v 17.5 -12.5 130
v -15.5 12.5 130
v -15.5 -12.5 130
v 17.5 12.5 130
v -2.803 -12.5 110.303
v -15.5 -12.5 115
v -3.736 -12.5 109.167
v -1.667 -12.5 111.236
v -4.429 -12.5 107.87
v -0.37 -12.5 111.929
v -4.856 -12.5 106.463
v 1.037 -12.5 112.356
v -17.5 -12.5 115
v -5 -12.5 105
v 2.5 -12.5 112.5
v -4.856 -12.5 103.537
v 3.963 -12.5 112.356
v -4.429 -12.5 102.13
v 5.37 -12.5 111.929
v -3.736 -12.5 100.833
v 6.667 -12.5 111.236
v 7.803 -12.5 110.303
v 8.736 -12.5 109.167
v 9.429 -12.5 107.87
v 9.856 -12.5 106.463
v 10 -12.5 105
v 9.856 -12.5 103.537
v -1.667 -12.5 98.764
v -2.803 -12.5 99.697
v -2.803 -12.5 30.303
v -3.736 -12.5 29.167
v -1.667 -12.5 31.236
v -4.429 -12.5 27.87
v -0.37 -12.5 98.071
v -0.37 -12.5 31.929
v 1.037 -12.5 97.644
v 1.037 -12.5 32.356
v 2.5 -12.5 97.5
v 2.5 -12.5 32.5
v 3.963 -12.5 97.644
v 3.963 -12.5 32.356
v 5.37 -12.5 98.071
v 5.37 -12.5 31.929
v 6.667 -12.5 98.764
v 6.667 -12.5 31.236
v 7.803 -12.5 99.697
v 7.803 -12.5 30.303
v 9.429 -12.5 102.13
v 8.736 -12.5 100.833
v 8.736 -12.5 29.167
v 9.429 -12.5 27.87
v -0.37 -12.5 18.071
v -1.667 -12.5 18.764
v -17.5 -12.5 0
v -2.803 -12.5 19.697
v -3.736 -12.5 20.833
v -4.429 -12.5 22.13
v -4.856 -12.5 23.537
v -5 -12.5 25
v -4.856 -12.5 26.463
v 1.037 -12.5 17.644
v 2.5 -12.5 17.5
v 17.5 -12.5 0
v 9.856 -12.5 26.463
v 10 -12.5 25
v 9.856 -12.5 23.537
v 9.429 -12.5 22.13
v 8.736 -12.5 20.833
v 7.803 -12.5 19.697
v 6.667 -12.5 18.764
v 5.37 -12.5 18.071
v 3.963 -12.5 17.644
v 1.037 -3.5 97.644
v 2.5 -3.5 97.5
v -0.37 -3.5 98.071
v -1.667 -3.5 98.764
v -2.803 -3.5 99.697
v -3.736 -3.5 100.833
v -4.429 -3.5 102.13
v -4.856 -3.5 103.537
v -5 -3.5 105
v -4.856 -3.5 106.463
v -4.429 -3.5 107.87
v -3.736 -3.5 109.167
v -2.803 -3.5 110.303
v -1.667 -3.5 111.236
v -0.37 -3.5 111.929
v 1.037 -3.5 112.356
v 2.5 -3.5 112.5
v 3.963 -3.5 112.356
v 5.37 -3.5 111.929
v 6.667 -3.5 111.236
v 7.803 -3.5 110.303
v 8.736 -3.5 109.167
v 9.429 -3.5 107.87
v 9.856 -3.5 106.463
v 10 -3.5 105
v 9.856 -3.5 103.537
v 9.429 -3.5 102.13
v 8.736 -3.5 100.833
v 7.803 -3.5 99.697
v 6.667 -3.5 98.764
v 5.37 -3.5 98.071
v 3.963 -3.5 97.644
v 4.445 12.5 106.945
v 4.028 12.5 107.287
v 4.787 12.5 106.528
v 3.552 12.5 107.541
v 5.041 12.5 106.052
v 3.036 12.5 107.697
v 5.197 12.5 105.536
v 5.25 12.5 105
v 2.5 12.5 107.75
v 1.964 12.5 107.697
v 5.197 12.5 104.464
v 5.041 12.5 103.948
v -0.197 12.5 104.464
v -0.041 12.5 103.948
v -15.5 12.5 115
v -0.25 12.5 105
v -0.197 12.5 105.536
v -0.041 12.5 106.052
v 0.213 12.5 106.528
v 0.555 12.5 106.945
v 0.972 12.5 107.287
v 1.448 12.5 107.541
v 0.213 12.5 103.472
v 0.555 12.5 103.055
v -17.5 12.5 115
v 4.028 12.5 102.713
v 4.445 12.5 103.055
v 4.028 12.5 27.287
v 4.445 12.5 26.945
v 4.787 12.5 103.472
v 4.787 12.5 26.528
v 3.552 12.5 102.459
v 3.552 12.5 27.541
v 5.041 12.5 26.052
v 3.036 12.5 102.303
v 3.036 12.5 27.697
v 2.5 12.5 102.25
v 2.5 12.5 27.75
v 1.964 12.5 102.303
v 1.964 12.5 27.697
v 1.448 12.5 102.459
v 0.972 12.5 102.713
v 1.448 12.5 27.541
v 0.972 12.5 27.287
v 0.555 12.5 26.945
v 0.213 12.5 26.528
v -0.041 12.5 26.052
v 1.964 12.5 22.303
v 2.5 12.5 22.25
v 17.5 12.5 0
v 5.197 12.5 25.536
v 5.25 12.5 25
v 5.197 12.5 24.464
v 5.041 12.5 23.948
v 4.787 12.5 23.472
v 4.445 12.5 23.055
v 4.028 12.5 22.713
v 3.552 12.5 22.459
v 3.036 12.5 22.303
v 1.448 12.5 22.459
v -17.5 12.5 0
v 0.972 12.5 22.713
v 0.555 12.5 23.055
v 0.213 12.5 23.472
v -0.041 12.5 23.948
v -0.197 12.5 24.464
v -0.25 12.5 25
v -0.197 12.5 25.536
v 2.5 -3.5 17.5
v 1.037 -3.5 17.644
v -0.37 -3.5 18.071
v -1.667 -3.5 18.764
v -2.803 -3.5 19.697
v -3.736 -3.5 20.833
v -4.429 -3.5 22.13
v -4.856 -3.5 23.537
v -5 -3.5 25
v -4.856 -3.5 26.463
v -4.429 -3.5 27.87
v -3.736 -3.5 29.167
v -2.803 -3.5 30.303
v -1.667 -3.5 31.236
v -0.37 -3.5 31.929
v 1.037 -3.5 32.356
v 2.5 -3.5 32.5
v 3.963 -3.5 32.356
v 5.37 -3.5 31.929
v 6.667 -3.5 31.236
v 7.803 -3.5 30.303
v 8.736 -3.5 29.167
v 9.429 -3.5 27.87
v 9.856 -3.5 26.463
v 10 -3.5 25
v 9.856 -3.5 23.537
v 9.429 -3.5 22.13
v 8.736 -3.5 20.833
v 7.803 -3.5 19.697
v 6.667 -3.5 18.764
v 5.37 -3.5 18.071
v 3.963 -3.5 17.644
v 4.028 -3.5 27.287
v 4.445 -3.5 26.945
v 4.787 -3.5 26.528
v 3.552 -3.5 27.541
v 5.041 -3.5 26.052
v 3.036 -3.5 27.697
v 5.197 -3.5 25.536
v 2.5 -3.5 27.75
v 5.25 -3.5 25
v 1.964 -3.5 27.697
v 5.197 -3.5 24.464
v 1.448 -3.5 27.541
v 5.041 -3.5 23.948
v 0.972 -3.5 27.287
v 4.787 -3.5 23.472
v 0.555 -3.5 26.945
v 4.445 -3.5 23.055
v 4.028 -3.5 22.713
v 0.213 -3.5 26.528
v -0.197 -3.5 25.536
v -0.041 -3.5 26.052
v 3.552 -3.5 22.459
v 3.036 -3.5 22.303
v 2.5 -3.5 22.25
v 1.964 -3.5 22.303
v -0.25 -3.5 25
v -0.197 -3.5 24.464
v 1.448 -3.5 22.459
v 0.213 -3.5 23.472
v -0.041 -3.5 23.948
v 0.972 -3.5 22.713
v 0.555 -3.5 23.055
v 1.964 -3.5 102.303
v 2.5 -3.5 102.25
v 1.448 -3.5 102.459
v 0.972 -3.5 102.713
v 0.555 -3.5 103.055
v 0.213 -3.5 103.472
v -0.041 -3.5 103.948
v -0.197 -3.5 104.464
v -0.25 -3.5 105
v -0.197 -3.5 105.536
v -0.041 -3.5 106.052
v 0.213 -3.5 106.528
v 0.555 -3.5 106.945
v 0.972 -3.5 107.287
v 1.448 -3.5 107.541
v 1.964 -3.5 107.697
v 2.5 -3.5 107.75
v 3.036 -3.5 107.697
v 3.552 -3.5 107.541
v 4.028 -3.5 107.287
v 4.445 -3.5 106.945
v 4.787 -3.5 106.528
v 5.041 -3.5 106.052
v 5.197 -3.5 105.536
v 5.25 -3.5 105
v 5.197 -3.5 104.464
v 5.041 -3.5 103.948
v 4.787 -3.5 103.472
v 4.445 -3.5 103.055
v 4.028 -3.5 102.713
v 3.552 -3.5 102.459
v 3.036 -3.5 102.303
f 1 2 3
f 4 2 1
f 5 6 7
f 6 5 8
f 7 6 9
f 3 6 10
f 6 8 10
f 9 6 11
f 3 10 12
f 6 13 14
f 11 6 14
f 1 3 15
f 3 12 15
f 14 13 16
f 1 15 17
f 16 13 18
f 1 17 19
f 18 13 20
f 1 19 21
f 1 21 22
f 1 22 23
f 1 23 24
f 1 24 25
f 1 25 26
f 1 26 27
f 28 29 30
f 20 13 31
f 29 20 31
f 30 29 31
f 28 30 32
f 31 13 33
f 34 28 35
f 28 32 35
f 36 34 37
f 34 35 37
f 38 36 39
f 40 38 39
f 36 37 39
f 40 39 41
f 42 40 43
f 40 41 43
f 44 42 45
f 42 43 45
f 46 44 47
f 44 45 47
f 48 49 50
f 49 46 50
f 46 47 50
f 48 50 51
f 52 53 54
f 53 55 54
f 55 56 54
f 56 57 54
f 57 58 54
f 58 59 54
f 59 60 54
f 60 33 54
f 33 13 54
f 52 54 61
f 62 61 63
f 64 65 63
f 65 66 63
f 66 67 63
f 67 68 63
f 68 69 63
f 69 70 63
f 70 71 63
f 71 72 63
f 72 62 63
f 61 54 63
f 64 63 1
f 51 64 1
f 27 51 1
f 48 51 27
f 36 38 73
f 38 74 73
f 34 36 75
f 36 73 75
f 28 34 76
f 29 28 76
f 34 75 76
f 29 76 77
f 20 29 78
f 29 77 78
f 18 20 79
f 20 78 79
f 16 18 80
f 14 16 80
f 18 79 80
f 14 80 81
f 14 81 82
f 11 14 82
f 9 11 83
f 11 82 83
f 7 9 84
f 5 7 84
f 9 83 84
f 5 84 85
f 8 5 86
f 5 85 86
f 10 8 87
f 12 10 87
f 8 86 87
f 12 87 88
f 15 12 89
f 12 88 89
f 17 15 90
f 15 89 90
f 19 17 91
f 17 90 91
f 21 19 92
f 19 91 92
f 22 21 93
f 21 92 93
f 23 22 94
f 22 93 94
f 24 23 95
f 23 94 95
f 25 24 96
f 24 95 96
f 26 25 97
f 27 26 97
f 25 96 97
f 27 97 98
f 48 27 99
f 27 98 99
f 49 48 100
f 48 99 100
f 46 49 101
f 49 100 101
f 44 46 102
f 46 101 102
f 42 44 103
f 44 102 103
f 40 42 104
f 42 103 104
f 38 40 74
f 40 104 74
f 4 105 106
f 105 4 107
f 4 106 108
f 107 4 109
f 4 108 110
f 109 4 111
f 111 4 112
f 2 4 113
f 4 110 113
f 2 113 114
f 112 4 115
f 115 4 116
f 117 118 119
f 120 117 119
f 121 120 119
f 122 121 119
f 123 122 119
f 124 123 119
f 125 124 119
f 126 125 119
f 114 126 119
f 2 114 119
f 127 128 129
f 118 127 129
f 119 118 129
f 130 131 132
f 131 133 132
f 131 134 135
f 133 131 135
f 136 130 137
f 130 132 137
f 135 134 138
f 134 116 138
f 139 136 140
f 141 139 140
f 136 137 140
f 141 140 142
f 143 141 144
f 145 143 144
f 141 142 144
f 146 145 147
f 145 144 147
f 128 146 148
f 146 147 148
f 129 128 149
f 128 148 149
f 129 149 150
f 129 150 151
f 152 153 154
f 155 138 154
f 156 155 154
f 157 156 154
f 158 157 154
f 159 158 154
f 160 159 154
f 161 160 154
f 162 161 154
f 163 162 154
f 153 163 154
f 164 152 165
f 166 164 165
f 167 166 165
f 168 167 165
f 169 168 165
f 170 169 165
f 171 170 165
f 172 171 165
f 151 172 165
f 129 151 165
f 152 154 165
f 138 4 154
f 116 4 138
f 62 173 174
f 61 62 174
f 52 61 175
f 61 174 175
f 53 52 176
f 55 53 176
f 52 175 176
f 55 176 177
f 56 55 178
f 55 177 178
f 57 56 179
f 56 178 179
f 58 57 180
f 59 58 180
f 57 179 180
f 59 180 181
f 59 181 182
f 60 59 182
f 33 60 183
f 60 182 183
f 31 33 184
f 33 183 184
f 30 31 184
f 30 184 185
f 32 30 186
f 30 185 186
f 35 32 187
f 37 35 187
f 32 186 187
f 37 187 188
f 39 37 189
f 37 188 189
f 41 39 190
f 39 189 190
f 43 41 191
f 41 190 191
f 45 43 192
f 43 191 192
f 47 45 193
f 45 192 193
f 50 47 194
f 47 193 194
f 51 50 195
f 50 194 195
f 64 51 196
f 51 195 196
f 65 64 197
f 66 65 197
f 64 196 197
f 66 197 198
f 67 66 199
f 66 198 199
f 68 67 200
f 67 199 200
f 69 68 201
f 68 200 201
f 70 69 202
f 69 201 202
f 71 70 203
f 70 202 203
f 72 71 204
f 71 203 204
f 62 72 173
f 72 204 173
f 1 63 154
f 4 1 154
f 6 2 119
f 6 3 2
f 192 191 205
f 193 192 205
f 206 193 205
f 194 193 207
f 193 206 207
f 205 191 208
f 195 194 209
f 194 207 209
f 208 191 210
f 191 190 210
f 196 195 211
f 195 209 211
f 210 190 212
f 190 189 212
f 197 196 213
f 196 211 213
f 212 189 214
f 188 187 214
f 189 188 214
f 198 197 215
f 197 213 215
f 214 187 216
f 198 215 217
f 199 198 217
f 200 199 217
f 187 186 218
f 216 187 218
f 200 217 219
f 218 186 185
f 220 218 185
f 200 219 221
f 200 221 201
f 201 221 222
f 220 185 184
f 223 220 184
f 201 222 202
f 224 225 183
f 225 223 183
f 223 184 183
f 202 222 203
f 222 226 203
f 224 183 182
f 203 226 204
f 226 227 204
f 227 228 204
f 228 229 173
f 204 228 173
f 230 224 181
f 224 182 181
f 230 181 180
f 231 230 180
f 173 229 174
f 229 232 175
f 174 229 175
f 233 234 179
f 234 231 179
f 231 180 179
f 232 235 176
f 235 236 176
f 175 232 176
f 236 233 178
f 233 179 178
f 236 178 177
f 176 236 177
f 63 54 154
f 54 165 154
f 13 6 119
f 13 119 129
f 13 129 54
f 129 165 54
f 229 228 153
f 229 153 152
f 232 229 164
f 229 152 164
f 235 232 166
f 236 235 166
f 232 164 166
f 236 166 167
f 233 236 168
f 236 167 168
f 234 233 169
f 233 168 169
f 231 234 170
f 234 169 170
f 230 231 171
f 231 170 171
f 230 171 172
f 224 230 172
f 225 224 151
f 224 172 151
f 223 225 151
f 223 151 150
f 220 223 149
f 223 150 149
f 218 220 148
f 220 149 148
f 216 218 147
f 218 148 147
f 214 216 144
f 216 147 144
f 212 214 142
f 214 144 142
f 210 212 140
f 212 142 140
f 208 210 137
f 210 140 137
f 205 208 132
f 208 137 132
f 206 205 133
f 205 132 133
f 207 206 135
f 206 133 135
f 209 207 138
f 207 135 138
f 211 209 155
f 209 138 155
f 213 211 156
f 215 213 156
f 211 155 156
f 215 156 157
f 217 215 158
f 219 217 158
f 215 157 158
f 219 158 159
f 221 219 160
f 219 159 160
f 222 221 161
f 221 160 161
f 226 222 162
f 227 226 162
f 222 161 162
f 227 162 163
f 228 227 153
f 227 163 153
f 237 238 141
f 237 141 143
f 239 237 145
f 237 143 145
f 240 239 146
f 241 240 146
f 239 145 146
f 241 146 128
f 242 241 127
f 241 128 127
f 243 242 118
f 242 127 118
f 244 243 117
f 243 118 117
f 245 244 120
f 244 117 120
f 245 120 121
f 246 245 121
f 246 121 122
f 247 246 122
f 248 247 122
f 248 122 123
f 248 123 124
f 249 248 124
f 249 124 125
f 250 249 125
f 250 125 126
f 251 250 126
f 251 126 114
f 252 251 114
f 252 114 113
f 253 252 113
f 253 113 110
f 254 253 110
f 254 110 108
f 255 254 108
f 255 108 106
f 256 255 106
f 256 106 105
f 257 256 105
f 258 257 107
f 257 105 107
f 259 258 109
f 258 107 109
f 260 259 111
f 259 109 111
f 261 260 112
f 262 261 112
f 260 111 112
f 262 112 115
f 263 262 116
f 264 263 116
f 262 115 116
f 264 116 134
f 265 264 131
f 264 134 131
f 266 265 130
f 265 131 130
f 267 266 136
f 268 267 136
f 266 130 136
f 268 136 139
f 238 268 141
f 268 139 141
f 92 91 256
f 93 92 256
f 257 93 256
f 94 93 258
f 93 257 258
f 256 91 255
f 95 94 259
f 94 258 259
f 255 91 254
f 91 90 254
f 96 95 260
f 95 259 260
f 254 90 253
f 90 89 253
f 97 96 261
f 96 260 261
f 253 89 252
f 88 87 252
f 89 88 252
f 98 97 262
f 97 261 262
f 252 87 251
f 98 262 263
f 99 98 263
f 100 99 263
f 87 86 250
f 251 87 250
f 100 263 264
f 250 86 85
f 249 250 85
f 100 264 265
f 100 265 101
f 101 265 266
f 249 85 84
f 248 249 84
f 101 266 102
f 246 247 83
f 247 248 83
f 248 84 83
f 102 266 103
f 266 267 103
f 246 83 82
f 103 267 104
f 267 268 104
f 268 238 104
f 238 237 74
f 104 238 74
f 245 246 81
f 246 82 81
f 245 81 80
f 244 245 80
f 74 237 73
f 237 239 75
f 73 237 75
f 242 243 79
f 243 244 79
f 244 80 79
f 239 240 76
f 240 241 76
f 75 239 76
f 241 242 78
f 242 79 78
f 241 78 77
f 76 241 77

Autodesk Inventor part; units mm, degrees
ref_plane "YZ Plane" through (0, 0, 0) normal (1, 0, 0) x (0, 1, 0)
ref_plane "XZ Plane" through (0, 0, 0) normal (0, 1, 0) x (-1, 0, 0)
ref_plane "XY Plane" through (0, 0, 0) normal (0, 0, 1) x (1, 0, 0)
sketch "Sketch1" plane through (0, 0, 0) normal (0, 0, 1) x (1, 0, 0)
  line L0 (-17.5, -12.5) -> (17.5, -12.5)
  line L1 (17.5, -12.5) -> (17.5, 12.5)
  line L2 (17.5, 12.5) -> (-17.5, 12.5)
  line L3 (-17.5, 12.5) -> (-17.5, -12.5)
  line L4 (-17.5, -12.5) -> (17.5, 12.5) construction
  line L5 (17.5, -12.5) -> (-17.5, 12.5) construction
  point P0 (0, 0)
  dimension "d0" = 35
  dimension "d1" = 25
extrude "Extrusion1" add sketch "Sketch1" along normal blind 130
sketch "Sketch2" plane through (-17.5, -12.5, 0) normal (0, -1, 0) x (1, 0, 0)
  line L0 (2, 115) -> (0, 115)
  line L1 (0, 115) -> (0, 130)
  line L2 (0, 130) -> (2, 130)
  line L3 (2, 130) -> (2, 115)
  line L4 (0, 0) -> (0, 130) projected
  line L5 (0, 130) -> (35, 130) projected
  point P0 (17.5, 0)
  dimension "d4" = 2
  dimension "d5" = 15
extrude "Extrusion2" cut sketch "Sketch2" against normal through all
sketch "Sketch3" plane through (-17.5, -12.5, 0) normal (0, -1, 0) x (1, 0, 0)
  line L0 (2, 130) -> (35, 130) projected
  line L1 (35, 0) -> (35, 130) projected
  line L2 (0, 0) -> (35, 0) projected
  point P0 (17.5, 0)
  point P1 (20, 105)
  point P2 (20, 25)
  dimension "d8" = 25
  dimension "d9" = 15
  dimension "d10" = 25
hole "Hole1" at (2.5, -12.5, 105) at (2.5, -12.5, 25) direction (0, 1, 0) diameter 5.5 end through all counterbore diameter 15 counterbore depth 9 clearance for "Socket Head Cap Screw ISO 4762" size "M5" standard "ISO"
equation "\"d10\" = d8"
properties part number "Distanzblock_rechts" material "Aluminum 6061"
